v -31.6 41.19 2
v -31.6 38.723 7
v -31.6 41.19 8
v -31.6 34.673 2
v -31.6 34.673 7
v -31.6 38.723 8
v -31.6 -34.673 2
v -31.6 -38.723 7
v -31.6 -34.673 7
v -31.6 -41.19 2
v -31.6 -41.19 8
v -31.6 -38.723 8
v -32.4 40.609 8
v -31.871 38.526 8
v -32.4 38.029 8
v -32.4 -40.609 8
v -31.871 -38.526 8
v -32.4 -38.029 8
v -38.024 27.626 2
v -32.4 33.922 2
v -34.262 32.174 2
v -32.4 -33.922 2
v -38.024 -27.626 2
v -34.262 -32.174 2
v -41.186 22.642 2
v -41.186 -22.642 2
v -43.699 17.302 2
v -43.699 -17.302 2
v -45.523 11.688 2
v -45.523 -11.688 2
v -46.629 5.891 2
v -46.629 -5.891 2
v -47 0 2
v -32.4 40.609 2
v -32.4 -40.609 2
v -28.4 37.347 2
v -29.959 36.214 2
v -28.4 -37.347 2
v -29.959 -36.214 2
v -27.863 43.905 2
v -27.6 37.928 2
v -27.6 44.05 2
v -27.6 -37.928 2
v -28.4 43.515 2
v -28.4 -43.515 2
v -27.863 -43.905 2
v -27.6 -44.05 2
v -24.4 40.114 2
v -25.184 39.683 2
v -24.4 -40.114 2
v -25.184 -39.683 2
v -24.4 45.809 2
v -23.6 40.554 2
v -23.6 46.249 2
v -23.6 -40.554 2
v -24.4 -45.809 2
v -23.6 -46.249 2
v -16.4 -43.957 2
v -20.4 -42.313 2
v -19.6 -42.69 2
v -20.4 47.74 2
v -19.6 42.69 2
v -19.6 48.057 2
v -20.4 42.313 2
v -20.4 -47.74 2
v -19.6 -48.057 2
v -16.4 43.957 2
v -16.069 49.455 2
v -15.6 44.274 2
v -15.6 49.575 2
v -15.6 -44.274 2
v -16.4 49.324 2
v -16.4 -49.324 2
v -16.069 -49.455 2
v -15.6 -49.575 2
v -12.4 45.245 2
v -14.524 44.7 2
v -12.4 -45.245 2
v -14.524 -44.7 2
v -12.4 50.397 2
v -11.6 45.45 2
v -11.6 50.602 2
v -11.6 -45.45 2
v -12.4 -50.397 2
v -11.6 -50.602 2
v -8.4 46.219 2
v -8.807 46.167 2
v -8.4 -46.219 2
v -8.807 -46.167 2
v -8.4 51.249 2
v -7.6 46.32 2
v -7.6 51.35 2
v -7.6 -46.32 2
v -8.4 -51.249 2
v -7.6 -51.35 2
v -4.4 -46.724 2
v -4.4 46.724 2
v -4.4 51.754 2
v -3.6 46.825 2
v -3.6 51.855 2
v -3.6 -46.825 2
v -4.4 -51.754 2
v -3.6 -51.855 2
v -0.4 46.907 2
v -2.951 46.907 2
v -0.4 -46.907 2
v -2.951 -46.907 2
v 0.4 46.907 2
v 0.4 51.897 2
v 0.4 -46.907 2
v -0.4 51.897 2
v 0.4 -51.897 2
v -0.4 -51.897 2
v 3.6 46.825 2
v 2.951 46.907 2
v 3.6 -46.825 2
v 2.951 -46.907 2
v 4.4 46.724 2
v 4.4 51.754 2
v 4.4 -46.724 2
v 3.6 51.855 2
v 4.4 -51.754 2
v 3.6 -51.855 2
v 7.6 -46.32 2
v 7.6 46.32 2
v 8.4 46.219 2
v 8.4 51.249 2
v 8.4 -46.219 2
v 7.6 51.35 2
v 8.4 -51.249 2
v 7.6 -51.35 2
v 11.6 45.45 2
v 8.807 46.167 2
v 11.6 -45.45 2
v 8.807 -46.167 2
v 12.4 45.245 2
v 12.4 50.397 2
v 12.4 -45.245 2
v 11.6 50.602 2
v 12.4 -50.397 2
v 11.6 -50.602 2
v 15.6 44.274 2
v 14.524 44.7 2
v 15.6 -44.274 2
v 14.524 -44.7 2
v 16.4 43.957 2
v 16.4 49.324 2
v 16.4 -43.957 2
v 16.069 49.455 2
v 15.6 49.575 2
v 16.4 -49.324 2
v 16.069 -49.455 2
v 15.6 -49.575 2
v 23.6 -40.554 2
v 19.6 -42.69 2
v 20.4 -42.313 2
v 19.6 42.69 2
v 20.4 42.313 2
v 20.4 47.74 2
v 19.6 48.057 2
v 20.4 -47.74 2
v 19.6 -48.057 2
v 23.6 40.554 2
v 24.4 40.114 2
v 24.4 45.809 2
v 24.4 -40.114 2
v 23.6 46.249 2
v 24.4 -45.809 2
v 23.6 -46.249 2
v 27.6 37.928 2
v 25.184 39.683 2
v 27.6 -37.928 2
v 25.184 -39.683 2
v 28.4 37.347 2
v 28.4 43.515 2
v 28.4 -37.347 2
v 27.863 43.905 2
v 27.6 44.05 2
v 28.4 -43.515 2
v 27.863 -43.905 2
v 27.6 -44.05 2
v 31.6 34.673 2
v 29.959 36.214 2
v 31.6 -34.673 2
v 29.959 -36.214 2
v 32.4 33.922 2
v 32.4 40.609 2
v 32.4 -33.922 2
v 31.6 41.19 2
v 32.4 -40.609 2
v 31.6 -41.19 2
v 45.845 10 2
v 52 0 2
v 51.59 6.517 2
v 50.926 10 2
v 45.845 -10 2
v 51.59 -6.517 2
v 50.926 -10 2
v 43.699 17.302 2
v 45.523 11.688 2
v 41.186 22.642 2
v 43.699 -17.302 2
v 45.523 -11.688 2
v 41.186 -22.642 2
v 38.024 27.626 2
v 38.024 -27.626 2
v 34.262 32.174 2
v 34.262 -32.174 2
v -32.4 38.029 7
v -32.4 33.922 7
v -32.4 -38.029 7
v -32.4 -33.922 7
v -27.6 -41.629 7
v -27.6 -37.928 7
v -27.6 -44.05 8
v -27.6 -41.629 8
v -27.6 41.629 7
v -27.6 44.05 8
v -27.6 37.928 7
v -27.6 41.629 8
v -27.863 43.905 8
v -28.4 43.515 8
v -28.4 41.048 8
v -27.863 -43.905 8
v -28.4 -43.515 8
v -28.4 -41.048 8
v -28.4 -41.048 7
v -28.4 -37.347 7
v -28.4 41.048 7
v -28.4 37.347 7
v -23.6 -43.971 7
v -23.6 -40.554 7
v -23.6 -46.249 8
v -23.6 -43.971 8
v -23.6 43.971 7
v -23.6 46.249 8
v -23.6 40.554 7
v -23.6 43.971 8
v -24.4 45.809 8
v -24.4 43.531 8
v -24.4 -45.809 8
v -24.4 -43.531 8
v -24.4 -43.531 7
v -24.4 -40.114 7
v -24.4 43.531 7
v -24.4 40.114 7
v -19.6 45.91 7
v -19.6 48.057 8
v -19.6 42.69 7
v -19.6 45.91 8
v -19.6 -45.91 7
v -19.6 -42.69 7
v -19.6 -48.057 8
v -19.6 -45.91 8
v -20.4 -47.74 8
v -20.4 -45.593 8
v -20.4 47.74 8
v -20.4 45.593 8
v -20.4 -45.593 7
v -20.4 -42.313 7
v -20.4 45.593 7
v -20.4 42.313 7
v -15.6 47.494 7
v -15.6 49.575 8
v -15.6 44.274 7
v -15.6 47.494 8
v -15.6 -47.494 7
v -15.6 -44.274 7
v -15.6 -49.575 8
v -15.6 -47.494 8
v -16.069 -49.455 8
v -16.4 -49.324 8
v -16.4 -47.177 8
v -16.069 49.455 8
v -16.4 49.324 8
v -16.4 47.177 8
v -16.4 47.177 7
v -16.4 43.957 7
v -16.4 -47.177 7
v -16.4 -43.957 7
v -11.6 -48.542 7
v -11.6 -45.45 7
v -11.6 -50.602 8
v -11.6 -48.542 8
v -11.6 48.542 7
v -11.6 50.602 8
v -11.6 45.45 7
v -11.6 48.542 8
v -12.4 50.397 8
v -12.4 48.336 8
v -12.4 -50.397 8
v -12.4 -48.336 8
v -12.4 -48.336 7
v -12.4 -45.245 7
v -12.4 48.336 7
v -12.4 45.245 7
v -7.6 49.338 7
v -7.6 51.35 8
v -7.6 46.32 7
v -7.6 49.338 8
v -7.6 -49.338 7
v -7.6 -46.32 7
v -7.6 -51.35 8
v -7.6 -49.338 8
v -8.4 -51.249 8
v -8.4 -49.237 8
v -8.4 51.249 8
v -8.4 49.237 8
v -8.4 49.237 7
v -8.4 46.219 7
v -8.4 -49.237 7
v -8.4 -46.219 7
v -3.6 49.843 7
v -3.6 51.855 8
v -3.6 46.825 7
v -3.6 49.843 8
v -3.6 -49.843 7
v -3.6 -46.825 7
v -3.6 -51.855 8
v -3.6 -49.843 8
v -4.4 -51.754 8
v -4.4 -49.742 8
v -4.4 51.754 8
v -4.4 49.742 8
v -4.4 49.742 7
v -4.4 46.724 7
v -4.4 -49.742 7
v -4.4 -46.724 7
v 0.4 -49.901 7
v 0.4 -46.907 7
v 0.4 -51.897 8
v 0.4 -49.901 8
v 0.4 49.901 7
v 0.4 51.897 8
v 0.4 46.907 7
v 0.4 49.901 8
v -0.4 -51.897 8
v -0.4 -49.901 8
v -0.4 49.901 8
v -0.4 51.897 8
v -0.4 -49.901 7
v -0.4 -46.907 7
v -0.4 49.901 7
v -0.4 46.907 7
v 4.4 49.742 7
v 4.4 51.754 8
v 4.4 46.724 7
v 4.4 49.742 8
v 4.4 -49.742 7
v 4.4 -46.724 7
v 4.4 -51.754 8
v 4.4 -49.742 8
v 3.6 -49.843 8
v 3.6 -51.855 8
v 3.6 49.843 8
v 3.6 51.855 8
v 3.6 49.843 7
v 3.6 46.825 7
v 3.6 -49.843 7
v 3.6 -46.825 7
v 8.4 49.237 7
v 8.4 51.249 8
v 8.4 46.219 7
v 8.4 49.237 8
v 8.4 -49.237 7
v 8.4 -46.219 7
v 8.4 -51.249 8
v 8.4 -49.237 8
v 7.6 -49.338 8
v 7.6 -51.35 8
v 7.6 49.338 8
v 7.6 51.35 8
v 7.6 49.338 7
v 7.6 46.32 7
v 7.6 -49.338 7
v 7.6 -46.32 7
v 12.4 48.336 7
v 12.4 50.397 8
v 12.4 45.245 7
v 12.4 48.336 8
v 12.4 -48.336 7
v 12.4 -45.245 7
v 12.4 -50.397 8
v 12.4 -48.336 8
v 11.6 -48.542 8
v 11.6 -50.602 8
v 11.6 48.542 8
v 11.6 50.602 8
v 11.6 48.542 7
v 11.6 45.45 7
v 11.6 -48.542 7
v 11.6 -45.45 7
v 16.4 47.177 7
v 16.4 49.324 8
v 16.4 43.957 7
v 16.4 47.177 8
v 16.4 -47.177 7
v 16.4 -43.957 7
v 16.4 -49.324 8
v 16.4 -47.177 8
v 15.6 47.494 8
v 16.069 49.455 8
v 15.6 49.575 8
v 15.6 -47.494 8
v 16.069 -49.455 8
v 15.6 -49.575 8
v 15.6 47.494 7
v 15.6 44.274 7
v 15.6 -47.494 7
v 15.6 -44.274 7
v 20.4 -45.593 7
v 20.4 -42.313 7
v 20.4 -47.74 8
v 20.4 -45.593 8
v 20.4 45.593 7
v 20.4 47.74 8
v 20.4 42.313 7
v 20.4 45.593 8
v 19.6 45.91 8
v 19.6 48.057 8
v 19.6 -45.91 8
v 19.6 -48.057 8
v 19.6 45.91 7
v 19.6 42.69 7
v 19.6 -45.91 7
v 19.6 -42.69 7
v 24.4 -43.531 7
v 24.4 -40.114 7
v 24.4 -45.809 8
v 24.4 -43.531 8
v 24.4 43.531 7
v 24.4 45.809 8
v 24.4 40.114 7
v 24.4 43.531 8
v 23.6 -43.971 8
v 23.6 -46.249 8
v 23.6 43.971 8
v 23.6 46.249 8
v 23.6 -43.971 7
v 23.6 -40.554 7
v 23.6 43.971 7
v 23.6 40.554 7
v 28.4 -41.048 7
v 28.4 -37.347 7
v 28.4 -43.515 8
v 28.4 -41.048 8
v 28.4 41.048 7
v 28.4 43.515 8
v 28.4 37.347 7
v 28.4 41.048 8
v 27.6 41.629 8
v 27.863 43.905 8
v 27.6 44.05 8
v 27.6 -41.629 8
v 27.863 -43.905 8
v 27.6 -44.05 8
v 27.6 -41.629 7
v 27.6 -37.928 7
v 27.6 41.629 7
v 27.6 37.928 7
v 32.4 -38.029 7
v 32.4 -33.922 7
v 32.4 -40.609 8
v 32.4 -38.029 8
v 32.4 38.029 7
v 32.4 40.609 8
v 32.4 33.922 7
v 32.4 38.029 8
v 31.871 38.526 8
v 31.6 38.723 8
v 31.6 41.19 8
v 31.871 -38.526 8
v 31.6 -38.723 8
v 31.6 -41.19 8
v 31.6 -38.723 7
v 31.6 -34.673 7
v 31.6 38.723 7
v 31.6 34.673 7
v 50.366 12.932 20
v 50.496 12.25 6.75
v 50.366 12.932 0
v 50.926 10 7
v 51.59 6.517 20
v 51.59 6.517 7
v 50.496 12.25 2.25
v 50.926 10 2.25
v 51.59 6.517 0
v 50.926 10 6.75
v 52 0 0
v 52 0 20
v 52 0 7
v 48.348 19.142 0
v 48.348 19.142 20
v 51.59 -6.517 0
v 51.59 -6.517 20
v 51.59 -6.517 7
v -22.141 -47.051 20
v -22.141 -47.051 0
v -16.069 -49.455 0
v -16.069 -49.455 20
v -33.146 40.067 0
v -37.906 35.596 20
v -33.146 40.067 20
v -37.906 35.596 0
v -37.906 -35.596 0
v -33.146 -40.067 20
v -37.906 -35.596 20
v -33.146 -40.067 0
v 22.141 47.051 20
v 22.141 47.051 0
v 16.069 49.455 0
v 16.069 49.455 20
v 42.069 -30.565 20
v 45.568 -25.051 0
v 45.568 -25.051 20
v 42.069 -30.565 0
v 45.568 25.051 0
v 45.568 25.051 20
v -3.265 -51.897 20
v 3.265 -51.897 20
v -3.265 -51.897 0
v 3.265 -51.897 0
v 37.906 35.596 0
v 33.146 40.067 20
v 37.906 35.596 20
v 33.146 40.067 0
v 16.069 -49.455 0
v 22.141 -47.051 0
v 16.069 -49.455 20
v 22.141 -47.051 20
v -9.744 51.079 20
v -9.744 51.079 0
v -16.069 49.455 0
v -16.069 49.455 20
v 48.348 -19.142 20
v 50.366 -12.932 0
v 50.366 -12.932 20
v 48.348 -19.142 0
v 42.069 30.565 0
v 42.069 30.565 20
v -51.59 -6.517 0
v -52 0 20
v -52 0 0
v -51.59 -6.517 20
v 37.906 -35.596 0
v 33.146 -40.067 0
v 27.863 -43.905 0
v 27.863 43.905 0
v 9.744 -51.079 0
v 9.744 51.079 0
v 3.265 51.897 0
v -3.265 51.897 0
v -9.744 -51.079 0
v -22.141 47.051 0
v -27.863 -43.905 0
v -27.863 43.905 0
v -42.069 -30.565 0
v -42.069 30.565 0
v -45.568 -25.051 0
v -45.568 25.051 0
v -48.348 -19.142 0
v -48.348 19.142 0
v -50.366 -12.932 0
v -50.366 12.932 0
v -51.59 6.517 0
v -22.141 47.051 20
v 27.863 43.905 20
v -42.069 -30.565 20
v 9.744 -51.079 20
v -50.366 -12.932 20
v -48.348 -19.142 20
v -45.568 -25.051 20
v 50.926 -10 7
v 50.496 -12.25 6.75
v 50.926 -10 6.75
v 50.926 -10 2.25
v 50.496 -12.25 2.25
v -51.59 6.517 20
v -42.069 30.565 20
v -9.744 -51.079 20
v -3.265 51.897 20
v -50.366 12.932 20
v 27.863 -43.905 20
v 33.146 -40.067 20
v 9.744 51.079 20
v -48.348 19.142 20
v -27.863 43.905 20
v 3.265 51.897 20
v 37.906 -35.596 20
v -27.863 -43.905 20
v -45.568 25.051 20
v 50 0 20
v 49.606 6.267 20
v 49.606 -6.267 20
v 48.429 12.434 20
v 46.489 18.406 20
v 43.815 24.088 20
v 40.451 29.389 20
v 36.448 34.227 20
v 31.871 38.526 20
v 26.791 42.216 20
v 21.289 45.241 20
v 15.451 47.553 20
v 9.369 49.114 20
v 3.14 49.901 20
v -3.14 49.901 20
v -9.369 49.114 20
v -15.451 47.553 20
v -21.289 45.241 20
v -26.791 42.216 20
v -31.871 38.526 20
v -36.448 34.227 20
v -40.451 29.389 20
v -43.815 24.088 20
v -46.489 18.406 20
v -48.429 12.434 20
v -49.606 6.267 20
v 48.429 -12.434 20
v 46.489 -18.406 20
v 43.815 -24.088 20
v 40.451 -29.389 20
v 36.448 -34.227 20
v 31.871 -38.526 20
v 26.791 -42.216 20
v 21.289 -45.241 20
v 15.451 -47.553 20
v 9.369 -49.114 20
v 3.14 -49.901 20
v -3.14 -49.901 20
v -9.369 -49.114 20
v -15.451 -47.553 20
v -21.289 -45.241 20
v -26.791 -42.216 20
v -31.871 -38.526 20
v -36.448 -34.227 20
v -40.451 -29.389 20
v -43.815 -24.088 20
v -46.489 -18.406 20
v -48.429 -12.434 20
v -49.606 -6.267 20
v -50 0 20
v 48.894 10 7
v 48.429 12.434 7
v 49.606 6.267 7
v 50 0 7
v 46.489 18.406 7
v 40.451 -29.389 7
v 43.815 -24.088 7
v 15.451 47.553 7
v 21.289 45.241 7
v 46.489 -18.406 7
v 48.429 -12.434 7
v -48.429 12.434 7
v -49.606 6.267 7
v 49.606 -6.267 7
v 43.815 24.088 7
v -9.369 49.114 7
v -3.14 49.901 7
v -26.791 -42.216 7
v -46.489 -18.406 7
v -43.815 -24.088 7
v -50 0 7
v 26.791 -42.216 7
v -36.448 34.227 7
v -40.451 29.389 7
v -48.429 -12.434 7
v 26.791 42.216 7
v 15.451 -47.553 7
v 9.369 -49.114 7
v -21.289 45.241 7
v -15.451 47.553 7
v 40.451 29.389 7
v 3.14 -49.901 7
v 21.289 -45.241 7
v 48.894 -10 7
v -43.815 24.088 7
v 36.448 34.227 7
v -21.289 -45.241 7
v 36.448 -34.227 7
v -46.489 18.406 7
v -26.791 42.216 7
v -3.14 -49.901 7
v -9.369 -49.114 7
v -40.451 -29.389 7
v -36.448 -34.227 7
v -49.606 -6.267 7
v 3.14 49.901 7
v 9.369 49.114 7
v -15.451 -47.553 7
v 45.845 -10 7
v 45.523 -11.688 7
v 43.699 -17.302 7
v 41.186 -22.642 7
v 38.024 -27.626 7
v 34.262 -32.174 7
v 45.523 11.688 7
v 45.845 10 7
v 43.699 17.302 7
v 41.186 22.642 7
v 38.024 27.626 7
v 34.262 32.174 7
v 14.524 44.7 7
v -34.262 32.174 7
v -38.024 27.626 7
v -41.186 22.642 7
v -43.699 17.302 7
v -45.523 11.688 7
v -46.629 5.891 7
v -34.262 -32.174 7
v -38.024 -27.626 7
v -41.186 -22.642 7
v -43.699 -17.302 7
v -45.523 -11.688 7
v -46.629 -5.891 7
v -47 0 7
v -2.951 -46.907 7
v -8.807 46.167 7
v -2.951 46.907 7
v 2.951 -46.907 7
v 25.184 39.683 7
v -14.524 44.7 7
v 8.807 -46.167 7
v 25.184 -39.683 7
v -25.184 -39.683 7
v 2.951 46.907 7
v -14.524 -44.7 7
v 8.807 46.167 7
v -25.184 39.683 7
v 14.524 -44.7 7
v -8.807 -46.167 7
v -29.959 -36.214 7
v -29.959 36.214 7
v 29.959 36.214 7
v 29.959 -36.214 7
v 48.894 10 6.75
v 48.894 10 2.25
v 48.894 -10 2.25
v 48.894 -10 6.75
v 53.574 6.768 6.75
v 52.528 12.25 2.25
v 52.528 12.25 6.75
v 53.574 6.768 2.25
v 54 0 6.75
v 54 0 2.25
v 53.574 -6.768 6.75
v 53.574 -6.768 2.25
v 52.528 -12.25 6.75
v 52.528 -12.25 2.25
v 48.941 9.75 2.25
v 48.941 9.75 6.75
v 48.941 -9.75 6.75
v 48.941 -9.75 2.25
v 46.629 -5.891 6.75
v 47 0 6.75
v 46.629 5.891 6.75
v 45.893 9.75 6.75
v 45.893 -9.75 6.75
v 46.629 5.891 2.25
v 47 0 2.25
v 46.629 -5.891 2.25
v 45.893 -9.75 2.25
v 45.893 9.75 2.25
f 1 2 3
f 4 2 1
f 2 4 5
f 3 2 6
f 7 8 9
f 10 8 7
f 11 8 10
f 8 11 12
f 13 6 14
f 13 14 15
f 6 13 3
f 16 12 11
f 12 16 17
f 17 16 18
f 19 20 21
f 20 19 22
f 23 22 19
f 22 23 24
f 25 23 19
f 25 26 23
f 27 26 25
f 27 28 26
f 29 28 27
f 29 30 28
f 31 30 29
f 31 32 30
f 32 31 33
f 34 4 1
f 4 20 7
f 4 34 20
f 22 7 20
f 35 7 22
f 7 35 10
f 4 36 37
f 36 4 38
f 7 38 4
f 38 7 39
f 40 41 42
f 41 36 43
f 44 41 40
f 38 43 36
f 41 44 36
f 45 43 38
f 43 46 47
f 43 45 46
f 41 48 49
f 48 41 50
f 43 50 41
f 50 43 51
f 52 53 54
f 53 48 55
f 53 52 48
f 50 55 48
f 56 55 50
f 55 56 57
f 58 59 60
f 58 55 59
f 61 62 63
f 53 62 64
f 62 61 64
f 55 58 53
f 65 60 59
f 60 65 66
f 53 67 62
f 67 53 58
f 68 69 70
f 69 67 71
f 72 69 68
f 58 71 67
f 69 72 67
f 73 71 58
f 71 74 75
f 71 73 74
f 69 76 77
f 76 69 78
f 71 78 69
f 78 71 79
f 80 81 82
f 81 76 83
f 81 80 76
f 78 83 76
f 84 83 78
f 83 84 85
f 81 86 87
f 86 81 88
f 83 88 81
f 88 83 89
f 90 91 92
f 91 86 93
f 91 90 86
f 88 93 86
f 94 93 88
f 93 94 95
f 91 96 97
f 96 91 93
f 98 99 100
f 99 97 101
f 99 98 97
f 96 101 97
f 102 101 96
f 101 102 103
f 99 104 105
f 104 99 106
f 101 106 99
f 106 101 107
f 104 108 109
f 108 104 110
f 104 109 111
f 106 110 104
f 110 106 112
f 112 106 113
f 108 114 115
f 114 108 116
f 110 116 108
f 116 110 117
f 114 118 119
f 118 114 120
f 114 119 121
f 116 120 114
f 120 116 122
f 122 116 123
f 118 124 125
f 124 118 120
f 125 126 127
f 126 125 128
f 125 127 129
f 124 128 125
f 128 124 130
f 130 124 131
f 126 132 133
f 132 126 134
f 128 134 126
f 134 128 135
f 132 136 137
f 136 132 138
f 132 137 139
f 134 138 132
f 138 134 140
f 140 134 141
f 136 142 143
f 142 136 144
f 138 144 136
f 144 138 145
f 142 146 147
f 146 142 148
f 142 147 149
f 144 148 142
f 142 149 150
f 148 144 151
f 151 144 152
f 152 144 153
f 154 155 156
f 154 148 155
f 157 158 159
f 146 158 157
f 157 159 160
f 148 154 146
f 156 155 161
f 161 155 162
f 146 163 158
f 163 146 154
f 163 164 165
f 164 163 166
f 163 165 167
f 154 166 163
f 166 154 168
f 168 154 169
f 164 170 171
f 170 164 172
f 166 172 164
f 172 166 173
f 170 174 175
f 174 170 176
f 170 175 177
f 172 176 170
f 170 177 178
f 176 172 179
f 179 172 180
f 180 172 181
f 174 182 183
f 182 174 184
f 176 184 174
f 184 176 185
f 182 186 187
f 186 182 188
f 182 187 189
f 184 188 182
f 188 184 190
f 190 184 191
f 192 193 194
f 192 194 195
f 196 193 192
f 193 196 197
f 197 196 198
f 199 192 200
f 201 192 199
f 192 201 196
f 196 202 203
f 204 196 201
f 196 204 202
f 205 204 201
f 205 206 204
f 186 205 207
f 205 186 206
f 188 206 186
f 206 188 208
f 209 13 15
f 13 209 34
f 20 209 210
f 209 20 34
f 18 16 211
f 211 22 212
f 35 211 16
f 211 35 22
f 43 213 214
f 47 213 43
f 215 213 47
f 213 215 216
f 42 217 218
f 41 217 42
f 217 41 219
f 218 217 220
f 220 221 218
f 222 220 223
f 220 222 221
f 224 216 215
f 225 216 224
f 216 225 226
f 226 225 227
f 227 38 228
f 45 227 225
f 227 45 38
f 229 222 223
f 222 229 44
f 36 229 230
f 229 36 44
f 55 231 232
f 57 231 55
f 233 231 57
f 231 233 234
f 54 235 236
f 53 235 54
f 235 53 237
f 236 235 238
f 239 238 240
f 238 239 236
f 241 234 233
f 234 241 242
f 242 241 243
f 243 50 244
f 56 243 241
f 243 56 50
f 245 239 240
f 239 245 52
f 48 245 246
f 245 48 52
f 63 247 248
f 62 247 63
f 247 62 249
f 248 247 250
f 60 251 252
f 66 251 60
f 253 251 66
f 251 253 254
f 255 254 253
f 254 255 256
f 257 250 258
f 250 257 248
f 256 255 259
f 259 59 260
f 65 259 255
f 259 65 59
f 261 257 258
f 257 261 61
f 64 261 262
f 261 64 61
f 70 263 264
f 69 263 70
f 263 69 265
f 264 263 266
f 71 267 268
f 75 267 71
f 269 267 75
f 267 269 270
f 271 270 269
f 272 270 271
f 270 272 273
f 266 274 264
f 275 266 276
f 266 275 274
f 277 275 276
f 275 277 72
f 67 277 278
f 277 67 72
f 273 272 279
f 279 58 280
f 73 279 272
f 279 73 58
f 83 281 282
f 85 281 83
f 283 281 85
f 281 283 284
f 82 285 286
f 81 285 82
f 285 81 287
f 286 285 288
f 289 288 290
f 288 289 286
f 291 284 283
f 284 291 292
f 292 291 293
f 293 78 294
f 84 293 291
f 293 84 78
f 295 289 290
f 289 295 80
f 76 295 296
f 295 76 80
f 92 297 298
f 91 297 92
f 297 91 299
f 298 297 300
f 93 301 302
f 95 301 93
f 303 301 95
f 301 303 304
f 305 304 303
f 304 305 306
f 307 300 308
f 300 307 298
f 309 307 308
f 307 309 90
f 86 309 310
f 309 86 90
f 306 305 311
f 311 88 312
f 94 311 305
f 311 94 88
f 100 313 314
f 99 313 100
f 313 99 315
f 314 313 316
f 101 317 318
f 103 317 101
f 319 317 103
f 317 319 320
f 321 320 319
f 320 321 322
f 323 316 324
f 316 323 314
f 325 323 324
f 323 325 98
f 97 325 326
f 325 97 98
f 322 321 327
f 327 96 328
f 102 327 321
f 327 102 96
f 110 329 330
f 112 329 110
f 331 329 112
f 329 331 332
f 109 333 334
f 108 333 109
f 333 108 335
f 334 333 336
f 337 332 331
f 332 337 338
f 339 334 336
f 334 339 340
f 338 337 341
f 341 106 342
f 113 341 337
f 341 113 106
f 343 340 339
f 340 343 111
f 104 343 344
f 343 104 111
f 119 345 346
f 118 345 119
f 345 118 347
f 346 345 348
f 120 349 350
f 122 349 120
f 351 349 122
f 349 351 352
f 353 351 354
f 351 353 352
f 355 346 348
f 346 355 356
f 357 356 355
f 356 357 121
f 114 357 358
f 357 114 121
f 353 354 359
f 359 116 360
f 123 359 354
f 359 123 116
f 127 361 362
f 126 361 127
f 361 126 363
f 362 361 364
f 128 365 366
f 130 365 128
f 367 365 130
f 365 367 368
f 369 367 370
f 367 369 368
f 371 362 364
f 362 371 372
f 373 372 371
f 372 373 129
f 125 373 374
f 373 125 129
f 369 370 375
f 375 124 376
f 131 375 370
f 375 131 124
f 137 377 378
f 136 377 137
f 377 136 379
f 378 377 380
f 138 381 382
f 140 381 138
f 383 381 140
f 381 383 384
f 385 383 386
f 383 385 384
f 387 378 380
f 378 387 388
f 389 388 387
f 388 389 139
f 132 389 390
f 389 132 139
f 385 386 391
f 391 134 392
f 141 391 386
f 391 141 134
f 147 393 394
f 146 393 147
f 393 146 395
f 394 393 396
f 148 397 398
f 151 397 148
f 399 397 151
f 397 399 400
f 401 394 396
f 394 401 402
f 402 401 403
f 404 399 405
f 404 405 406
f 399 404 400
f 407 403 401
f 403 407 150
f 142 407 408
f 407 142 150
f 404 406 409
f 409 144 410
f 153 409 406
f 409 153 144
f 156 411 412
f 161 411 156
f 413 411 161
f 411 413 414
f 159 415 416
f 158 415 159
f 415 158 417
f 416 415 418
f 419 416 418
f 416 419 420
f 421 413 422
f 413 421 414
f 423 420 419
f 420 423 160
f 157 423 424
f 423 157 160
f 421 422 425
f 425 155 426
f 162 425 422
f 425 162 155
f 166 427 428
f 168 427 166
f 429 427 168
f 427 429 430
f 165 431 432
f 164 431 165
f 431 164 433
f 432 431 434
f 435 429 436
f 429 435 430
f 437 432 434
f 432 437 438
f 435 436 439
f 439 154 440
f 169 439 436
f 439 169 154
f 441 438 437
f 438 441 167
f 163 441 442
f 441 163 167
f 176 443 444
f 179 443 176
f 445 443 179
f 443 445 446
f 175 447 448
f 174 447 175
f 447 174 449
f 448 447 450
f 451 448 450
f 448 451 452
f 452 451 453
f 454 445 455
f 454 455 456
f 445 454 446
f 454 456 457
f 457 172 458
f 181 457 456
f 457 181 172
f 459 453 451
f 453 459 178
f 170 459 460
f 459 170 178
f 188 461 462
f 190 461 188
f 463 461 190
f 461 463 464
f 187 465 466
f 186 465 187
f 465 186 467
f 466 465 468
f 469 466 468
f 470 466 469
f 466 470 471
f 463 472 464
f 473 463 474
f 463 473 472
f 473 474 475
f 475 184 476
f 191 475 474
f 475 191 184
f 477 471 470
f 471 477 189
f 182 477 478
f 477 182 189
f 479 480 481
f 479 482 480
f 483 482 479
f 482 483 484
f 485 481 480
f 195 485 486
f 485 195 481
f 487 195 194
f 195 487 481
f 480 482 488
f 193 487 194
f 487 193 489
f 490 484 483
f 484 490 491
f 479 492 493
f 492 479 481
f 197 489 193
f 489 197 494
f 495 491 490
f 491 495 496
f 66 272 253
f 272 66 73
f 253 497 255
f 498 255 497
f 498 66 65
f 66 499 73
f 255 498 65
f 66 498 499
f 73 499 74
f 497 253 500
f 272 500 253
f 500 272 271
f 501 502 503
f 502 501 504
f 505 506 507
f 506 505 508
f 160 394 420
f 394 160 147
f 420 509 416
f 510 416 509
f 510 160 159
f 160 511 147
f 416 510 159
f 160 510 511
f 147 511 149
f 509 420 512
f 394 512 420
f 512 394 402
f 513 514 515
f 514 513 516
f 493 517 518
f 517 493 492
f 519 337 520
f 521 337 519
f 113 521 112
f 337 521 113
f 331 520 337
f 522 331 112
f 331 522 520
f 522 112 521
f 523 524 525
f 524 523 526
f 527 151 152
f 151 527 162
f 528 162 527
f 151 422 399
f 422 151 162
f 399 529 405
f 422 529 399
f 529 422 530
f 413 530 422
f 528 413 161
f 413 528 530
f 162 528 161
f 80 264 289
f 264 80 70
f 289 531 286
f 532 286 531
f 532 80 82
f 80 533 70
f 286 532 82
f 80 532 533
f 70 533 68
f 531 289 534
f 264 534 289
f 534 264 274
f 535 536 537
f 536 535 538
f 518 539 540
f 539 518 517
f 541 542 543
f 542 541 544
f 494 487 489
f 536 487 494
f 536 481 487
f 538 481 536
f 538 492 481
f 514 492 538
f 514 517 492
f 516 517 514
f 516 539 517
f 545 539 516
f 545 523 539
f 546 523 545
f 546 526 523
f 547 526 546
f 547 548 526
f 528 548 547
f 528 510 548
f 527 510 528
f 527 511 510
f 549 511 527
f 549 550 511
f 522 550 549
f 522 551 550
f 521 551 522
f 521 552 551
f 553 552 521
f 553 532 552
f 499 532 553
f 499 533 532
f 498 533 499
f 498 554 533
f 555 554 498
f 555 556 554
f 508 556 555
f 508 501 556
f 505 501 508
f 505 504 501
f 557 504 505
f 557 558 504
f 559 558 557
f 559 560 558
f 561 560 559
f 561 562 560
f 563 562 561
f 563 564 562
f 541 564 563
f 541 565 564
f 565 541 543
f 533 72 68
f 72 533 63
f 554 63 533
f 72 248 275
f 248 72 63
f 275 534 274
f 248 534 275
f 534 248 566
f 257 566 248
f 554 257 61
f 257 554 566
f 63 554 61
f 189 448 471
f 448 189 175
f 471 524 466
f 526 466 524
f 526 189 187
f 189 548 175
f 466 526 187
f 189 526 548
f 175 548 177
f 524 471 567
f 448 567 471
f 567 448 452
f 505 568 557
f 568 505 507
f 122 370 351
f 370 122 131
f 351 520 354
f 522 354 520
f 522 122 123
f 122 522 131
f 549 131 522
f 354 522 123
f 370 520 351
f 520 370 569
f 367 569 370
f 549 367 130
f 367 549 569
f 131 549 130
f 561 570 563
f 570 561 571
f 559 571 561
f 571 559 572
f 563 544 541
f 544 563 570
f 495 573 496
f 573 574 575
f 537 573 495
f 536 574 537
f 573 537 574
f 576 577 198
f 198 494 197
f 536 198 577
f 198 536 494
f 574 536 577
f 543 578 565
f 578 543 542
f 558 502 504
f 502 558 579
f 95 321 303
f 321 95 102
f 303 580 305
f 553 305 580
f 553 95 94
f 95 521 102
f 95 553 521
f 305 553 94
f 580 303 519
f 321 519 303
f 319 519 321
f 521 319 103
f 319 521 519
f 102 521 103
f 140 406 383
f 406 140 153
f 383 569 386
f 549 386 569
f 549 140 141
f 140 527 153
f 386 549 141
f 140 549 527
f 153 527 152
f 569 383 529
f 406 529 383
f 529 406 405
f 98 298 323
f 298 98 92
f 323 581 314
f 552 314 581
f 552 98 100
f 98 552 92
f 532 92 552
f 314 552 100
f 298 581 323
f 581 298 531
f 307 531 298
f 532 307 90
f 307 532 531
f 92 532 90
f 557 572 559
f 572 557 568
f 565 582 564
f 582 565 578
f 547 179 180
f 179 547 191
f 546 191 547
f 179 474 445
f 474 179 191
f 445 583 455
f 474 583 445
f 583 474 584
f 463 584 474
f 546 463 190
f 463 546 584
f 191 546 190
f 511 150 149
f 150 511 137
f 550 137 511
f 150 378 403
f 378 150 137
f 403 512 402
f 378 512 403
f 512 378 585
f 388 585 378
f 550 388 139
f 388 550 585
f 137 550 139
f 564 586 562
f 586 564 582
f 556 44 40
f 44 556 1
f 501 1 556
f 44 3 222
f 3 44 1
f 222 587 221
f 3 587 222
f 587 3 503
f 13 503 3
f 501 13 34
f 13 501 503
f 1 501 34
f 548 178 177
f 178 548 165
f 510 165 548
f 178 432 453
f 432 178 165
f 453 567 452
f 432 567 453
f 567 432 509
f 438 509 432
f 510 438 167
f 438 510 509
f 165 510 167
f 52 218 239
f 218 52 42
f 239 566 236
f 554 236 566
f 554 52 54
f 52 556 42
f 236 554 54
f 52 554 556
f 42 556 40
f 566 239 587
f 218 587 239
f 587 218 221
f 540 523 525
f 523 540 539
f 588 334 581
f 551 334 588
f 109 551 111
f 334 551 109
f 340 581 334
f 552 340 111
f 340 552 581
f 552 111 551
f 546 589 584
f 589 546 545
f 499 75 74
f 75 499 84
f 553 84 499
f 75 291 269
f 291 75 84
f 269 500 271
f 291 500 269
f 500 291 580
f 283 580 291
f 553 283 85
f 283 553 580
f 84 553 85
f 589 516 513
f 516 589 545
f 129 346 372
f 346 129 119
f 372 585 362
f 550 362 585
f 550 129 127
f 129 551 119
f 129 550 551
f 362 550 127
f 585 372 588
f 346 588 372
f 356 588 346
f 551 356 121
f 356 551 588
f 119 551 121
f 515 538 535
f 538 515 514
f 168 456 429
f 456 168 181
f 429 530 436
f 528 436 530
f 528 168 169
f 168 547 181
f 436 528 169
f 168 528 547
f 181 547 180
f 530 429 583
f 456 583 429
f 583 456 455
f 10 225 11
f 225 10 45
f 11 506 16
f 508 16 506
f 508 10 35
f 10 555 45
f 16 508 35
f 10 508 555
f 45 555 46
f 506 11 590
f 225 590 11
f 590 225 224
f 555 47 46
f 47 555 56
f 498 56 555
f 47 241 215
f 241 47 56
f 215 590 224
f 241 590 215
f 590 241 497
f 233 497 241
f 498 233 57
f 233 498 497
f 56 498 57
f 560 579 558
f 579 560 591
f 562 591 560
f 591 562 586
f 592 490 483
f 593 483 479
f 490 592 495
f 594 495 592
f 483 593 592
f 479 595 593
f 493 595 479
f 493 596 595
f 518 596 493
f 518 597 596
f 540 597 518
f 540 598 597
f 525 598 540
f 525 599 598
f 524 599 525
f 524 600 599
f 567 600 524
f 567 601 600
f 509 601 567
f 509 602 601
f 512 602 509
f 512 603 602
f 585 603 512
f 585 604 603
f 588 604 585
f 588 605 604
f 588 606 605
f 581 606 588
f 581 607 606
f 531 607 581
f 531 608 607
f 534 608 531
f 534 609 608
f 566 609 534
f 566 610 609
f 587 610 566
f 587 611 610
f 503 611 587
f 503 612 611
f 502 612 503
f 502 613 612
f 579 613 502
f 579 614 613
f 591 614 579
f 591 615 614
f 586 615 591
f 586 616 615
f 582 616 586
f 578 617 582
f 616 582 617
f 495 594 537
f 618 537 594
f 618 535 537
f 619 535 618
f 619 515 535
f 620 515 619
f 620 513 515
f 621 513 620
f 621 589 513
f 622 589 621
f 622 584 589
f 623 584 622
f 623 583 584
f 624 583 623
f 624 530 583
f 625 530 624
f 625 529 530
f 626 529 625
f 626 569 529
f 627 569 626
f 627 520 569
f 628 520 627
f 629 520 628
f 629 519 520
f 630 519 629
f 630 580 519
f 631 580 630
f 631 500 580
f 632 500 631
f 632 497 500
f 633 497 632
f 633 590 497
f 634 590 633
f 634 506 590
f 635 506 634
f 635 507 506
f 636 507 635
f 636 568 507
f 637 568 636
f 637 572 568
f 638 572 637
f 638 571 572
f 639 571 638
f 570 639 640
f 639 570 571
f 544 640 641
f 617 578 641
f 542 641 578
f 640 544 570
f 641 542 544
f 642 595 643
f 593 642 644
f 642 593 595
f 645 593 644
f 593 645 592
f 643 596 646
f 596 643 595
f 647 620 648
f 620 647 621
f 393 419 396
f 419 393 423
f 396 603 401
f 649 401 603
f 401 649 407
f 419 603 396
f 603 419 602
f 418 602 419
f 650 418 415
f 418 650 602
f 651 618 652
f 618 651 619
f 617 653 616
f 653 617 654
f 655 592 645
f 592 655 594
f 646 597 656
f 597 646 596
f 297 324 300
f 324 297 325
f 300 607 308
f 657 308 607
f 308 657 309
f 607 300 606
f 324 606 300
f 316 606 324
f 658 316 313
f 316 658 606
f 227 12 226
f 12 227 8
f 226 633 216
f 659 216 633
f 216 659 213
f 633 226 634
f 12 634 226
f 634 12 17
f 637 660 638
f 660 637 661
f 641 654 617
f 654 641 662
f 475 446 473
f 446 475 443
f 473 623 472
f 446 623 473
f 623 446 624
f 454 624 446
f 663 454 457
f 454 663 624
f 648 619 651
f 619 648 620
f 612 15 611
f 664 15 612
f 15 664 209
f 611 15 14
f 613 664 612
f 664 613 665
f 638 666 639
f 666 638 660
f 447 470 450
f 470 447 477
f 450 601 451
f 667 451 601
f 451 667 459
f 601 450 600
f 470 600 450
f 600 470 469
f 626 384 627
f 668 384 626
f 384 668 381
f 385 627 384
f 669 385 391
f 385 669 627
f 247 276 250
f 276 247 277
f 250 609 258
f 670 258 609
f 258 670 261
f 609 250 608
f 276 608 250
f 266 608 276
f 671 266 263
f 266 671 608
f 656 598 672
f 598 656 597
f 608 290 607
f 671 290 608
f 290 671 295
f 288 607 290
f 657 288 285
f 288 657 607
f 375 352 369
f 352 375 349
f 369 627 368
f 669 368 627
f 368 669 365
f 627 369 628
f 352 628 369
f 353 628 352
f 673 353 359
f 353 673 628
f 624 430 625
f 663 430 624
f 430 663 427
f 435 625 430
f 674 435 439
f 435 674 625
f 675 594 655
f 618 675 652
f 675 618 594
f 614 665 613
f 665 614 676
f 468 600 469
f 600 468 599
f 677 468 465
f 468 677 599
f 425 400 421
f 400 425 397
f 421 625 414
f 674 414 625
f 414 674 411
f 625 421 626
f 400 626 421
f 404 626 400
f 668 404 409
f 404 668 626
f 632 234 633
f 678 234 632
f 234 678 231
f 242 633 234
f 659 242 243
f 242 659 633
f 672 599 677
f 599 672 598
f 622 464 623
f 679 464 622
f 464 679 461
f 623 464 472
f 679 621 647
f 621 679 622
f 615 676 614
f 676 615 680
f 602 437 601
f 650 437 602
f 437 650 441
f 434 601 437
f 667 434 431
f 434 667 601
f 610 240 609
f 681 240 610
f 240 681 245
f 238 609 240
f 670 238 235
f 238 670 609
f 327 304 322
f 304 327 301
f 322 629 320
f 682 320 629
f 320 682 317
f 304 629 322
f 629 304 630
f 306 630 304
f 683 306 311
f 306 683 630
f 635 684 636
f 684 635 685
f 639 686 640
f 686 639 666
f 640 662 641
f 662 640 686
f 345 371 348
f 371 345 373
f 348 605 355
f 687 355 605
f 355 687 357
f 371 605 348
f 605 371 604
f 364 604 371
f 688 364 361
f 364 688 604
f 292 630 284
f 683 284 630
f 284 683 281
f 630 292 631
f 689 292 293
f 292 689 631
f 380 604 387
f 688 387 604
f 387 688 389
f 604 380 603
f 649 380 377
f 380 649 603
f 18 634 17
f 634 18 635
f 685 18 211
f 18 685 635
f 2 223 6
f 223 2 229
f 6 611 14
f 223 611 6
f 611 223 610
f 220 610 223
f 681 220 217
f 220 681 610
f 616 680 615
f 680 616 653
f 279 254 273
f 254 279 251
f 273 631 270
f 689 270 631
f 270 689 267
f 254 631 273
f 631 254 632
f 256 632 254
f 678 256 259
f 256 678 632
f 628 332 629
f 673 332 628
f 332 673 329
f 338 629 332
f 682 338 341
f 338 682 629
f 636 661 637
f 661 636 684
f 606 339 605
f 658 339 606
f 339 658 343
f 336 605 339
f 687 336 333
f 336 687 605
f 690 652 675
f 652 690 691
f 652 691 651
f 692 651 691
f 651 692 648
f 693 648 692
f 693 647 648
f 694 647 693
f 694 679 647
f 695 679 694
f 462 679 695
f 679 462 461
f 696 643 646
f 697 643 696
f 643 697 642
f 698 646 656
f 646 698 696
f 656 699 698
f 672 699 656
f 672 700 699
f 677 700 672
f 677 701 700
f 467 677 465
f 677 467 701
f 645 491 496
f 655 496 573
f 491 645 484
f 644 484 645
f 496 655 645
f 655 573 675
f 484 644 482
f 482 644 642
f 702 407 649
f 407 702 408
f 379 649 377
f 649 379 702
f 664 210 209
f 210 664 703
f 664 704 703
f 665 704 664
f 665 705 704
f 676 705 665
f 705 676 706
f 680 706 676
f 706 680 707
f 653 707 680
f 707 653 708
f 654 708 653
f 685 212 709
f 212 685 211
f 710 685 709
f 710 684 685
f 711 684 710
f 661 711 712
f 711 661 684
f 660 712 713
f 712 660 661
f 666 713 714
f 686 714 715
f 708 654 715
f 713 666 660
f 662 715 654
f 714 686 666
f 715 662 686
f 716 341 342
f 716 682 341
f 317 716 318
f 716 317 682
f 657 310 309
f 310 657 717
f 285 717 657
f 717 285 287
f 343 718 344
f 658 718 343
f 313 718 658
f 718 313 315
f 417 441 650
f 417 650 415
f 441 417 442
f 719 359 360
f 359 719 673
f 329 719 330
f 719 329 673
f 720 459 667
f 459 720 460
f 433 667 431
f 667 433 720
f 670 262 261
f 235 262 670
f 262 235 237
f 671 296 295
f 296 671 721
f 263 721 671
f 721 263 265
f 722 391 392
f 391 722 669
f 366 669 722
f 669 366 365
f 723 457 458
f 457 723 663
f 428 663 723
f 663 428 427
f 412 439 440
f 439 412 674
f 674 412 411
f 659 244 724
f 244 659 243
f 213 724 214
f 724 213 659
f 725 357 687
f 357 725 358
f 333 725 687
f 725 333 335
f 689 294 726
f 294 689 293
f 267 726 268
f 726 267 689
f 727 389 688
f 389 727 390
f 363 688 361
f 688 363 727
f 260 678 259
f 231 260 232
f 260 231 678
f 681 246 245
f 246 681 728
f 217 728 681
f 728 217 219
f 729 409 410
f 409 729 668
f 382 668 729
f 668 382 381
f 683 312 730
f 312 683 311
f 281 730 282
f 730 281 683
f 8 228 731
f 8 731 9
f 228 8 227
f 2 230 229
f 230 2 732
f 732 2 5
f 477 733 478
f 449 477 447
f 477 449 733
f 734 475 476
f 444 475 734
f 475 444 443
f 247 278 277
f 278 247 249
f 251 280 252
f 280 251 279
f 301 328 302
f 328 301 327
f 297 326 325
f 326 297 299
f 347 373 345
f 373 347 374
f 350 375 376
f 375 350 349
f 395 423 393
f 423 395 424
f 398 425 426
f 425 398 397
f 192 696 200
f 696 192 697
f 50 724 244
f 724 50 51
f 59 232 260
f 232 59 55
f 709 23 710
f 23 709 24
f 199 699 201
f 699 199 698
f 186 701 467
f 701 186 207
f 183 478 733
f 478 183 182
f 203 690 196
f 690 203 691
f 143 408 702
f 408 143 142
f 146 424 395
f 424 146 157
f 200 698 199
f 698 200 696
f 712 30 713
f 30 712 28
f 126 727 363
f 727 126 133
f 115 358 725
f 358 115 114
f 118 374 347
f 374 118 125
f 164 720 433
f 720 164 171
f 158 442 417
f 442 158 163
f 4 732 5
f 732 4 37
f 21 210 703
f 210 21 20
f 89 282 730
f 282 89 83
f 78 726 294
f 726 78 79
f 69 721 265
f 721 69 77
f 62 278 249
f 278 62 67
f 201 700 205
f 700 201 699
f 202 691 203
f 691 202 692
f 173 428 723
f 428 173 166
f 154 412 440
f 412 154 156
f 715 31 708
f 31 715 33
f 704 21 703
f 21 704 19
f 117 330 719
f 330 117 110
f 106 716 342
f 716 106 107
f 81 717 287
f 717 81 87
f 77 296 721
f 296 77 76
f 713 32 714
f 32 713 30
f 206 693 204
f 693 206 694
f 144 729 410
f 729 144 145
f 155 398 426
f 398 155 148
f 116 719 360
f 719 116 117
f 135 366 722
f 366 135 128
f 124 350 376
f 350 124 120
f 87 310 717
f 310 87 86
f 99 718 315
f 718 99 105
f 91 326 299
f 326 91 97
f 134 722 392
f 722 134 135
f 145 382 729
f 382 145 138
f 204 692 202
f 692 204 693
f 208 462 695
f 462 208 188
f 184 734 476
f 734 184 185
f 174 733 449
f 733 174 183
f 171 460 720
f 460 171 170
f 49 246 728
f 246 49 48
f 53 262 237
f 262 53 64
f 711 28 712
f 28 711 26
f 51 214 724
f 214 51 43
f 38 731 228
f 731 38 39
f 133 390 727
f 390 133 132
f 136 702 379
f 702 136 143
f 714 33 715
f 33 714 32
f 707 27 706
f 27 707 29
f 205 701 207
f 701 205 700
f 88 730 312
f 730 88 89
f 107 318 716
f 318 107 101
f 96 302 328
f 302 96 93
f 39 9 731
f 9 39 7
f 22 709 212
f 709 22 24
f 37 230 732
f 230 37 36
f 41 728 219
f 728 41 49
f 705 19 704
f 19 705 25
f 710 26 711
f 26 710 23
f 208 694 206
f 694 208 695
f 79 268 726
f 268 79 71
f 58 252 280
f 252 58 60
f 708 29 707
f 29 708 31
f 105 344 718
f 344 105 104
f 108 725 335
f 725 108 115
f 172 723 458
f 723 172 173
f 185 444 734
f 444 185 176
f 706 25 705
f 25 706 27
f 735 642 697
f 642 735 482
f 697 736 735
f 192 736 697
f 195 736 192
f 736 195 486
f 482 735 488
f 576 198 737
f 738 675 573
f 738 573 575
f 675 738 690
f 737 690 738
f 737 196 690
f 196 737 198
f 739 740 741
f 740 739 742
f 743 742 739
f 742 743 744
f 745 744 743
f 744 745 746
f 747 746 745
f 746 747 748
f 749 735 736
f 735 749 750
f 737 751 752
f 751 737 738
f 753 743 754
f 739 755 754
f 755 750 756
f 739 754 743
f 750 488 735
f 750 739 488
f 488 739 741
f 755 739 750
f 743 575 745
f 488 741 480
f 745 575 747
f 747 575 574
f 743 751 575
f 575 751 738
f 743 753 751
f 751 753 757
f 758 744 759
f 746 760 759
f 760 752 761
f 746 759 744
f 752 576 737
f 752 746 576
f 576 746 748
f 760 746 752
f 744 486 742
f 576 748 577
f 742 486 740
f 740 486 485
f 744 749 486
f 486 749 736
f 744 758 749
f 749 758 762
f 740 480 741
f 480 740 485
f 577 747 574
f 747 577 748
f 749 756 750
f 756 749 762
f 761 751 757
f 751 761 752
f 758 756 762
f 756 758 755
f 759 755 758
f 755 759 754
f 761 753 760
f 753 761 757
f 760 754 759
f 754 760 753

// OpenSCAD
d = 100;
glass_dome_inner_d = 94;
thick = 2.5;

$fn=50;
base();
//drawer();

module base(){
difference(){
cylinder(20, d/2+2, d/2+2);
    
translate([0,0,7])    
cylinder(25, d/2, d/2);
    
translate([0,0,2])    
cylinder(25, glass_dome_inner_d/2, glass_dome_inner_d/2);
    
for(i=[-8:8])
translate([4*i,0,5])cube([0.8,200,6], true);

translate([30,0,4.5])
cube([50,20, 5], true);
}
}

plug();
module plug() {

intersection(){
    difference(){
        cylinder(20, d/2+4, d/2+4);
        cylinder(20, d/2, d/2);
    }
    translate([30,0,4.5])
    cube([50,25-0.5, 5-0.5], true);
}    
    difference(){
       translate([28,0,4.5])
       cube([50,20-0.5, 5-0.5], true);
       cylinder(20, 94/2, 94/2); 
    }
}


module drawer(){
difference(){
intersection(){
    translate([30,0,4.5])
    cube([50,20-0.3, 5-0.3], true);
    
    cylinder(15, d/2+2, d/2+2);
}

translate([0,0,7])    
cylinder(25, d/2, d/2);

translate([0,0,7])
cube([d-20,15,4], true);

#translate([d/2+thick+1,0,7])
rotate([0,45,0])
cube([5,20,5], true);

#translate([-d/2-thick-1,0,7])
rotate([0,45,0])
cube([5,20,5], true);

}
    
}
